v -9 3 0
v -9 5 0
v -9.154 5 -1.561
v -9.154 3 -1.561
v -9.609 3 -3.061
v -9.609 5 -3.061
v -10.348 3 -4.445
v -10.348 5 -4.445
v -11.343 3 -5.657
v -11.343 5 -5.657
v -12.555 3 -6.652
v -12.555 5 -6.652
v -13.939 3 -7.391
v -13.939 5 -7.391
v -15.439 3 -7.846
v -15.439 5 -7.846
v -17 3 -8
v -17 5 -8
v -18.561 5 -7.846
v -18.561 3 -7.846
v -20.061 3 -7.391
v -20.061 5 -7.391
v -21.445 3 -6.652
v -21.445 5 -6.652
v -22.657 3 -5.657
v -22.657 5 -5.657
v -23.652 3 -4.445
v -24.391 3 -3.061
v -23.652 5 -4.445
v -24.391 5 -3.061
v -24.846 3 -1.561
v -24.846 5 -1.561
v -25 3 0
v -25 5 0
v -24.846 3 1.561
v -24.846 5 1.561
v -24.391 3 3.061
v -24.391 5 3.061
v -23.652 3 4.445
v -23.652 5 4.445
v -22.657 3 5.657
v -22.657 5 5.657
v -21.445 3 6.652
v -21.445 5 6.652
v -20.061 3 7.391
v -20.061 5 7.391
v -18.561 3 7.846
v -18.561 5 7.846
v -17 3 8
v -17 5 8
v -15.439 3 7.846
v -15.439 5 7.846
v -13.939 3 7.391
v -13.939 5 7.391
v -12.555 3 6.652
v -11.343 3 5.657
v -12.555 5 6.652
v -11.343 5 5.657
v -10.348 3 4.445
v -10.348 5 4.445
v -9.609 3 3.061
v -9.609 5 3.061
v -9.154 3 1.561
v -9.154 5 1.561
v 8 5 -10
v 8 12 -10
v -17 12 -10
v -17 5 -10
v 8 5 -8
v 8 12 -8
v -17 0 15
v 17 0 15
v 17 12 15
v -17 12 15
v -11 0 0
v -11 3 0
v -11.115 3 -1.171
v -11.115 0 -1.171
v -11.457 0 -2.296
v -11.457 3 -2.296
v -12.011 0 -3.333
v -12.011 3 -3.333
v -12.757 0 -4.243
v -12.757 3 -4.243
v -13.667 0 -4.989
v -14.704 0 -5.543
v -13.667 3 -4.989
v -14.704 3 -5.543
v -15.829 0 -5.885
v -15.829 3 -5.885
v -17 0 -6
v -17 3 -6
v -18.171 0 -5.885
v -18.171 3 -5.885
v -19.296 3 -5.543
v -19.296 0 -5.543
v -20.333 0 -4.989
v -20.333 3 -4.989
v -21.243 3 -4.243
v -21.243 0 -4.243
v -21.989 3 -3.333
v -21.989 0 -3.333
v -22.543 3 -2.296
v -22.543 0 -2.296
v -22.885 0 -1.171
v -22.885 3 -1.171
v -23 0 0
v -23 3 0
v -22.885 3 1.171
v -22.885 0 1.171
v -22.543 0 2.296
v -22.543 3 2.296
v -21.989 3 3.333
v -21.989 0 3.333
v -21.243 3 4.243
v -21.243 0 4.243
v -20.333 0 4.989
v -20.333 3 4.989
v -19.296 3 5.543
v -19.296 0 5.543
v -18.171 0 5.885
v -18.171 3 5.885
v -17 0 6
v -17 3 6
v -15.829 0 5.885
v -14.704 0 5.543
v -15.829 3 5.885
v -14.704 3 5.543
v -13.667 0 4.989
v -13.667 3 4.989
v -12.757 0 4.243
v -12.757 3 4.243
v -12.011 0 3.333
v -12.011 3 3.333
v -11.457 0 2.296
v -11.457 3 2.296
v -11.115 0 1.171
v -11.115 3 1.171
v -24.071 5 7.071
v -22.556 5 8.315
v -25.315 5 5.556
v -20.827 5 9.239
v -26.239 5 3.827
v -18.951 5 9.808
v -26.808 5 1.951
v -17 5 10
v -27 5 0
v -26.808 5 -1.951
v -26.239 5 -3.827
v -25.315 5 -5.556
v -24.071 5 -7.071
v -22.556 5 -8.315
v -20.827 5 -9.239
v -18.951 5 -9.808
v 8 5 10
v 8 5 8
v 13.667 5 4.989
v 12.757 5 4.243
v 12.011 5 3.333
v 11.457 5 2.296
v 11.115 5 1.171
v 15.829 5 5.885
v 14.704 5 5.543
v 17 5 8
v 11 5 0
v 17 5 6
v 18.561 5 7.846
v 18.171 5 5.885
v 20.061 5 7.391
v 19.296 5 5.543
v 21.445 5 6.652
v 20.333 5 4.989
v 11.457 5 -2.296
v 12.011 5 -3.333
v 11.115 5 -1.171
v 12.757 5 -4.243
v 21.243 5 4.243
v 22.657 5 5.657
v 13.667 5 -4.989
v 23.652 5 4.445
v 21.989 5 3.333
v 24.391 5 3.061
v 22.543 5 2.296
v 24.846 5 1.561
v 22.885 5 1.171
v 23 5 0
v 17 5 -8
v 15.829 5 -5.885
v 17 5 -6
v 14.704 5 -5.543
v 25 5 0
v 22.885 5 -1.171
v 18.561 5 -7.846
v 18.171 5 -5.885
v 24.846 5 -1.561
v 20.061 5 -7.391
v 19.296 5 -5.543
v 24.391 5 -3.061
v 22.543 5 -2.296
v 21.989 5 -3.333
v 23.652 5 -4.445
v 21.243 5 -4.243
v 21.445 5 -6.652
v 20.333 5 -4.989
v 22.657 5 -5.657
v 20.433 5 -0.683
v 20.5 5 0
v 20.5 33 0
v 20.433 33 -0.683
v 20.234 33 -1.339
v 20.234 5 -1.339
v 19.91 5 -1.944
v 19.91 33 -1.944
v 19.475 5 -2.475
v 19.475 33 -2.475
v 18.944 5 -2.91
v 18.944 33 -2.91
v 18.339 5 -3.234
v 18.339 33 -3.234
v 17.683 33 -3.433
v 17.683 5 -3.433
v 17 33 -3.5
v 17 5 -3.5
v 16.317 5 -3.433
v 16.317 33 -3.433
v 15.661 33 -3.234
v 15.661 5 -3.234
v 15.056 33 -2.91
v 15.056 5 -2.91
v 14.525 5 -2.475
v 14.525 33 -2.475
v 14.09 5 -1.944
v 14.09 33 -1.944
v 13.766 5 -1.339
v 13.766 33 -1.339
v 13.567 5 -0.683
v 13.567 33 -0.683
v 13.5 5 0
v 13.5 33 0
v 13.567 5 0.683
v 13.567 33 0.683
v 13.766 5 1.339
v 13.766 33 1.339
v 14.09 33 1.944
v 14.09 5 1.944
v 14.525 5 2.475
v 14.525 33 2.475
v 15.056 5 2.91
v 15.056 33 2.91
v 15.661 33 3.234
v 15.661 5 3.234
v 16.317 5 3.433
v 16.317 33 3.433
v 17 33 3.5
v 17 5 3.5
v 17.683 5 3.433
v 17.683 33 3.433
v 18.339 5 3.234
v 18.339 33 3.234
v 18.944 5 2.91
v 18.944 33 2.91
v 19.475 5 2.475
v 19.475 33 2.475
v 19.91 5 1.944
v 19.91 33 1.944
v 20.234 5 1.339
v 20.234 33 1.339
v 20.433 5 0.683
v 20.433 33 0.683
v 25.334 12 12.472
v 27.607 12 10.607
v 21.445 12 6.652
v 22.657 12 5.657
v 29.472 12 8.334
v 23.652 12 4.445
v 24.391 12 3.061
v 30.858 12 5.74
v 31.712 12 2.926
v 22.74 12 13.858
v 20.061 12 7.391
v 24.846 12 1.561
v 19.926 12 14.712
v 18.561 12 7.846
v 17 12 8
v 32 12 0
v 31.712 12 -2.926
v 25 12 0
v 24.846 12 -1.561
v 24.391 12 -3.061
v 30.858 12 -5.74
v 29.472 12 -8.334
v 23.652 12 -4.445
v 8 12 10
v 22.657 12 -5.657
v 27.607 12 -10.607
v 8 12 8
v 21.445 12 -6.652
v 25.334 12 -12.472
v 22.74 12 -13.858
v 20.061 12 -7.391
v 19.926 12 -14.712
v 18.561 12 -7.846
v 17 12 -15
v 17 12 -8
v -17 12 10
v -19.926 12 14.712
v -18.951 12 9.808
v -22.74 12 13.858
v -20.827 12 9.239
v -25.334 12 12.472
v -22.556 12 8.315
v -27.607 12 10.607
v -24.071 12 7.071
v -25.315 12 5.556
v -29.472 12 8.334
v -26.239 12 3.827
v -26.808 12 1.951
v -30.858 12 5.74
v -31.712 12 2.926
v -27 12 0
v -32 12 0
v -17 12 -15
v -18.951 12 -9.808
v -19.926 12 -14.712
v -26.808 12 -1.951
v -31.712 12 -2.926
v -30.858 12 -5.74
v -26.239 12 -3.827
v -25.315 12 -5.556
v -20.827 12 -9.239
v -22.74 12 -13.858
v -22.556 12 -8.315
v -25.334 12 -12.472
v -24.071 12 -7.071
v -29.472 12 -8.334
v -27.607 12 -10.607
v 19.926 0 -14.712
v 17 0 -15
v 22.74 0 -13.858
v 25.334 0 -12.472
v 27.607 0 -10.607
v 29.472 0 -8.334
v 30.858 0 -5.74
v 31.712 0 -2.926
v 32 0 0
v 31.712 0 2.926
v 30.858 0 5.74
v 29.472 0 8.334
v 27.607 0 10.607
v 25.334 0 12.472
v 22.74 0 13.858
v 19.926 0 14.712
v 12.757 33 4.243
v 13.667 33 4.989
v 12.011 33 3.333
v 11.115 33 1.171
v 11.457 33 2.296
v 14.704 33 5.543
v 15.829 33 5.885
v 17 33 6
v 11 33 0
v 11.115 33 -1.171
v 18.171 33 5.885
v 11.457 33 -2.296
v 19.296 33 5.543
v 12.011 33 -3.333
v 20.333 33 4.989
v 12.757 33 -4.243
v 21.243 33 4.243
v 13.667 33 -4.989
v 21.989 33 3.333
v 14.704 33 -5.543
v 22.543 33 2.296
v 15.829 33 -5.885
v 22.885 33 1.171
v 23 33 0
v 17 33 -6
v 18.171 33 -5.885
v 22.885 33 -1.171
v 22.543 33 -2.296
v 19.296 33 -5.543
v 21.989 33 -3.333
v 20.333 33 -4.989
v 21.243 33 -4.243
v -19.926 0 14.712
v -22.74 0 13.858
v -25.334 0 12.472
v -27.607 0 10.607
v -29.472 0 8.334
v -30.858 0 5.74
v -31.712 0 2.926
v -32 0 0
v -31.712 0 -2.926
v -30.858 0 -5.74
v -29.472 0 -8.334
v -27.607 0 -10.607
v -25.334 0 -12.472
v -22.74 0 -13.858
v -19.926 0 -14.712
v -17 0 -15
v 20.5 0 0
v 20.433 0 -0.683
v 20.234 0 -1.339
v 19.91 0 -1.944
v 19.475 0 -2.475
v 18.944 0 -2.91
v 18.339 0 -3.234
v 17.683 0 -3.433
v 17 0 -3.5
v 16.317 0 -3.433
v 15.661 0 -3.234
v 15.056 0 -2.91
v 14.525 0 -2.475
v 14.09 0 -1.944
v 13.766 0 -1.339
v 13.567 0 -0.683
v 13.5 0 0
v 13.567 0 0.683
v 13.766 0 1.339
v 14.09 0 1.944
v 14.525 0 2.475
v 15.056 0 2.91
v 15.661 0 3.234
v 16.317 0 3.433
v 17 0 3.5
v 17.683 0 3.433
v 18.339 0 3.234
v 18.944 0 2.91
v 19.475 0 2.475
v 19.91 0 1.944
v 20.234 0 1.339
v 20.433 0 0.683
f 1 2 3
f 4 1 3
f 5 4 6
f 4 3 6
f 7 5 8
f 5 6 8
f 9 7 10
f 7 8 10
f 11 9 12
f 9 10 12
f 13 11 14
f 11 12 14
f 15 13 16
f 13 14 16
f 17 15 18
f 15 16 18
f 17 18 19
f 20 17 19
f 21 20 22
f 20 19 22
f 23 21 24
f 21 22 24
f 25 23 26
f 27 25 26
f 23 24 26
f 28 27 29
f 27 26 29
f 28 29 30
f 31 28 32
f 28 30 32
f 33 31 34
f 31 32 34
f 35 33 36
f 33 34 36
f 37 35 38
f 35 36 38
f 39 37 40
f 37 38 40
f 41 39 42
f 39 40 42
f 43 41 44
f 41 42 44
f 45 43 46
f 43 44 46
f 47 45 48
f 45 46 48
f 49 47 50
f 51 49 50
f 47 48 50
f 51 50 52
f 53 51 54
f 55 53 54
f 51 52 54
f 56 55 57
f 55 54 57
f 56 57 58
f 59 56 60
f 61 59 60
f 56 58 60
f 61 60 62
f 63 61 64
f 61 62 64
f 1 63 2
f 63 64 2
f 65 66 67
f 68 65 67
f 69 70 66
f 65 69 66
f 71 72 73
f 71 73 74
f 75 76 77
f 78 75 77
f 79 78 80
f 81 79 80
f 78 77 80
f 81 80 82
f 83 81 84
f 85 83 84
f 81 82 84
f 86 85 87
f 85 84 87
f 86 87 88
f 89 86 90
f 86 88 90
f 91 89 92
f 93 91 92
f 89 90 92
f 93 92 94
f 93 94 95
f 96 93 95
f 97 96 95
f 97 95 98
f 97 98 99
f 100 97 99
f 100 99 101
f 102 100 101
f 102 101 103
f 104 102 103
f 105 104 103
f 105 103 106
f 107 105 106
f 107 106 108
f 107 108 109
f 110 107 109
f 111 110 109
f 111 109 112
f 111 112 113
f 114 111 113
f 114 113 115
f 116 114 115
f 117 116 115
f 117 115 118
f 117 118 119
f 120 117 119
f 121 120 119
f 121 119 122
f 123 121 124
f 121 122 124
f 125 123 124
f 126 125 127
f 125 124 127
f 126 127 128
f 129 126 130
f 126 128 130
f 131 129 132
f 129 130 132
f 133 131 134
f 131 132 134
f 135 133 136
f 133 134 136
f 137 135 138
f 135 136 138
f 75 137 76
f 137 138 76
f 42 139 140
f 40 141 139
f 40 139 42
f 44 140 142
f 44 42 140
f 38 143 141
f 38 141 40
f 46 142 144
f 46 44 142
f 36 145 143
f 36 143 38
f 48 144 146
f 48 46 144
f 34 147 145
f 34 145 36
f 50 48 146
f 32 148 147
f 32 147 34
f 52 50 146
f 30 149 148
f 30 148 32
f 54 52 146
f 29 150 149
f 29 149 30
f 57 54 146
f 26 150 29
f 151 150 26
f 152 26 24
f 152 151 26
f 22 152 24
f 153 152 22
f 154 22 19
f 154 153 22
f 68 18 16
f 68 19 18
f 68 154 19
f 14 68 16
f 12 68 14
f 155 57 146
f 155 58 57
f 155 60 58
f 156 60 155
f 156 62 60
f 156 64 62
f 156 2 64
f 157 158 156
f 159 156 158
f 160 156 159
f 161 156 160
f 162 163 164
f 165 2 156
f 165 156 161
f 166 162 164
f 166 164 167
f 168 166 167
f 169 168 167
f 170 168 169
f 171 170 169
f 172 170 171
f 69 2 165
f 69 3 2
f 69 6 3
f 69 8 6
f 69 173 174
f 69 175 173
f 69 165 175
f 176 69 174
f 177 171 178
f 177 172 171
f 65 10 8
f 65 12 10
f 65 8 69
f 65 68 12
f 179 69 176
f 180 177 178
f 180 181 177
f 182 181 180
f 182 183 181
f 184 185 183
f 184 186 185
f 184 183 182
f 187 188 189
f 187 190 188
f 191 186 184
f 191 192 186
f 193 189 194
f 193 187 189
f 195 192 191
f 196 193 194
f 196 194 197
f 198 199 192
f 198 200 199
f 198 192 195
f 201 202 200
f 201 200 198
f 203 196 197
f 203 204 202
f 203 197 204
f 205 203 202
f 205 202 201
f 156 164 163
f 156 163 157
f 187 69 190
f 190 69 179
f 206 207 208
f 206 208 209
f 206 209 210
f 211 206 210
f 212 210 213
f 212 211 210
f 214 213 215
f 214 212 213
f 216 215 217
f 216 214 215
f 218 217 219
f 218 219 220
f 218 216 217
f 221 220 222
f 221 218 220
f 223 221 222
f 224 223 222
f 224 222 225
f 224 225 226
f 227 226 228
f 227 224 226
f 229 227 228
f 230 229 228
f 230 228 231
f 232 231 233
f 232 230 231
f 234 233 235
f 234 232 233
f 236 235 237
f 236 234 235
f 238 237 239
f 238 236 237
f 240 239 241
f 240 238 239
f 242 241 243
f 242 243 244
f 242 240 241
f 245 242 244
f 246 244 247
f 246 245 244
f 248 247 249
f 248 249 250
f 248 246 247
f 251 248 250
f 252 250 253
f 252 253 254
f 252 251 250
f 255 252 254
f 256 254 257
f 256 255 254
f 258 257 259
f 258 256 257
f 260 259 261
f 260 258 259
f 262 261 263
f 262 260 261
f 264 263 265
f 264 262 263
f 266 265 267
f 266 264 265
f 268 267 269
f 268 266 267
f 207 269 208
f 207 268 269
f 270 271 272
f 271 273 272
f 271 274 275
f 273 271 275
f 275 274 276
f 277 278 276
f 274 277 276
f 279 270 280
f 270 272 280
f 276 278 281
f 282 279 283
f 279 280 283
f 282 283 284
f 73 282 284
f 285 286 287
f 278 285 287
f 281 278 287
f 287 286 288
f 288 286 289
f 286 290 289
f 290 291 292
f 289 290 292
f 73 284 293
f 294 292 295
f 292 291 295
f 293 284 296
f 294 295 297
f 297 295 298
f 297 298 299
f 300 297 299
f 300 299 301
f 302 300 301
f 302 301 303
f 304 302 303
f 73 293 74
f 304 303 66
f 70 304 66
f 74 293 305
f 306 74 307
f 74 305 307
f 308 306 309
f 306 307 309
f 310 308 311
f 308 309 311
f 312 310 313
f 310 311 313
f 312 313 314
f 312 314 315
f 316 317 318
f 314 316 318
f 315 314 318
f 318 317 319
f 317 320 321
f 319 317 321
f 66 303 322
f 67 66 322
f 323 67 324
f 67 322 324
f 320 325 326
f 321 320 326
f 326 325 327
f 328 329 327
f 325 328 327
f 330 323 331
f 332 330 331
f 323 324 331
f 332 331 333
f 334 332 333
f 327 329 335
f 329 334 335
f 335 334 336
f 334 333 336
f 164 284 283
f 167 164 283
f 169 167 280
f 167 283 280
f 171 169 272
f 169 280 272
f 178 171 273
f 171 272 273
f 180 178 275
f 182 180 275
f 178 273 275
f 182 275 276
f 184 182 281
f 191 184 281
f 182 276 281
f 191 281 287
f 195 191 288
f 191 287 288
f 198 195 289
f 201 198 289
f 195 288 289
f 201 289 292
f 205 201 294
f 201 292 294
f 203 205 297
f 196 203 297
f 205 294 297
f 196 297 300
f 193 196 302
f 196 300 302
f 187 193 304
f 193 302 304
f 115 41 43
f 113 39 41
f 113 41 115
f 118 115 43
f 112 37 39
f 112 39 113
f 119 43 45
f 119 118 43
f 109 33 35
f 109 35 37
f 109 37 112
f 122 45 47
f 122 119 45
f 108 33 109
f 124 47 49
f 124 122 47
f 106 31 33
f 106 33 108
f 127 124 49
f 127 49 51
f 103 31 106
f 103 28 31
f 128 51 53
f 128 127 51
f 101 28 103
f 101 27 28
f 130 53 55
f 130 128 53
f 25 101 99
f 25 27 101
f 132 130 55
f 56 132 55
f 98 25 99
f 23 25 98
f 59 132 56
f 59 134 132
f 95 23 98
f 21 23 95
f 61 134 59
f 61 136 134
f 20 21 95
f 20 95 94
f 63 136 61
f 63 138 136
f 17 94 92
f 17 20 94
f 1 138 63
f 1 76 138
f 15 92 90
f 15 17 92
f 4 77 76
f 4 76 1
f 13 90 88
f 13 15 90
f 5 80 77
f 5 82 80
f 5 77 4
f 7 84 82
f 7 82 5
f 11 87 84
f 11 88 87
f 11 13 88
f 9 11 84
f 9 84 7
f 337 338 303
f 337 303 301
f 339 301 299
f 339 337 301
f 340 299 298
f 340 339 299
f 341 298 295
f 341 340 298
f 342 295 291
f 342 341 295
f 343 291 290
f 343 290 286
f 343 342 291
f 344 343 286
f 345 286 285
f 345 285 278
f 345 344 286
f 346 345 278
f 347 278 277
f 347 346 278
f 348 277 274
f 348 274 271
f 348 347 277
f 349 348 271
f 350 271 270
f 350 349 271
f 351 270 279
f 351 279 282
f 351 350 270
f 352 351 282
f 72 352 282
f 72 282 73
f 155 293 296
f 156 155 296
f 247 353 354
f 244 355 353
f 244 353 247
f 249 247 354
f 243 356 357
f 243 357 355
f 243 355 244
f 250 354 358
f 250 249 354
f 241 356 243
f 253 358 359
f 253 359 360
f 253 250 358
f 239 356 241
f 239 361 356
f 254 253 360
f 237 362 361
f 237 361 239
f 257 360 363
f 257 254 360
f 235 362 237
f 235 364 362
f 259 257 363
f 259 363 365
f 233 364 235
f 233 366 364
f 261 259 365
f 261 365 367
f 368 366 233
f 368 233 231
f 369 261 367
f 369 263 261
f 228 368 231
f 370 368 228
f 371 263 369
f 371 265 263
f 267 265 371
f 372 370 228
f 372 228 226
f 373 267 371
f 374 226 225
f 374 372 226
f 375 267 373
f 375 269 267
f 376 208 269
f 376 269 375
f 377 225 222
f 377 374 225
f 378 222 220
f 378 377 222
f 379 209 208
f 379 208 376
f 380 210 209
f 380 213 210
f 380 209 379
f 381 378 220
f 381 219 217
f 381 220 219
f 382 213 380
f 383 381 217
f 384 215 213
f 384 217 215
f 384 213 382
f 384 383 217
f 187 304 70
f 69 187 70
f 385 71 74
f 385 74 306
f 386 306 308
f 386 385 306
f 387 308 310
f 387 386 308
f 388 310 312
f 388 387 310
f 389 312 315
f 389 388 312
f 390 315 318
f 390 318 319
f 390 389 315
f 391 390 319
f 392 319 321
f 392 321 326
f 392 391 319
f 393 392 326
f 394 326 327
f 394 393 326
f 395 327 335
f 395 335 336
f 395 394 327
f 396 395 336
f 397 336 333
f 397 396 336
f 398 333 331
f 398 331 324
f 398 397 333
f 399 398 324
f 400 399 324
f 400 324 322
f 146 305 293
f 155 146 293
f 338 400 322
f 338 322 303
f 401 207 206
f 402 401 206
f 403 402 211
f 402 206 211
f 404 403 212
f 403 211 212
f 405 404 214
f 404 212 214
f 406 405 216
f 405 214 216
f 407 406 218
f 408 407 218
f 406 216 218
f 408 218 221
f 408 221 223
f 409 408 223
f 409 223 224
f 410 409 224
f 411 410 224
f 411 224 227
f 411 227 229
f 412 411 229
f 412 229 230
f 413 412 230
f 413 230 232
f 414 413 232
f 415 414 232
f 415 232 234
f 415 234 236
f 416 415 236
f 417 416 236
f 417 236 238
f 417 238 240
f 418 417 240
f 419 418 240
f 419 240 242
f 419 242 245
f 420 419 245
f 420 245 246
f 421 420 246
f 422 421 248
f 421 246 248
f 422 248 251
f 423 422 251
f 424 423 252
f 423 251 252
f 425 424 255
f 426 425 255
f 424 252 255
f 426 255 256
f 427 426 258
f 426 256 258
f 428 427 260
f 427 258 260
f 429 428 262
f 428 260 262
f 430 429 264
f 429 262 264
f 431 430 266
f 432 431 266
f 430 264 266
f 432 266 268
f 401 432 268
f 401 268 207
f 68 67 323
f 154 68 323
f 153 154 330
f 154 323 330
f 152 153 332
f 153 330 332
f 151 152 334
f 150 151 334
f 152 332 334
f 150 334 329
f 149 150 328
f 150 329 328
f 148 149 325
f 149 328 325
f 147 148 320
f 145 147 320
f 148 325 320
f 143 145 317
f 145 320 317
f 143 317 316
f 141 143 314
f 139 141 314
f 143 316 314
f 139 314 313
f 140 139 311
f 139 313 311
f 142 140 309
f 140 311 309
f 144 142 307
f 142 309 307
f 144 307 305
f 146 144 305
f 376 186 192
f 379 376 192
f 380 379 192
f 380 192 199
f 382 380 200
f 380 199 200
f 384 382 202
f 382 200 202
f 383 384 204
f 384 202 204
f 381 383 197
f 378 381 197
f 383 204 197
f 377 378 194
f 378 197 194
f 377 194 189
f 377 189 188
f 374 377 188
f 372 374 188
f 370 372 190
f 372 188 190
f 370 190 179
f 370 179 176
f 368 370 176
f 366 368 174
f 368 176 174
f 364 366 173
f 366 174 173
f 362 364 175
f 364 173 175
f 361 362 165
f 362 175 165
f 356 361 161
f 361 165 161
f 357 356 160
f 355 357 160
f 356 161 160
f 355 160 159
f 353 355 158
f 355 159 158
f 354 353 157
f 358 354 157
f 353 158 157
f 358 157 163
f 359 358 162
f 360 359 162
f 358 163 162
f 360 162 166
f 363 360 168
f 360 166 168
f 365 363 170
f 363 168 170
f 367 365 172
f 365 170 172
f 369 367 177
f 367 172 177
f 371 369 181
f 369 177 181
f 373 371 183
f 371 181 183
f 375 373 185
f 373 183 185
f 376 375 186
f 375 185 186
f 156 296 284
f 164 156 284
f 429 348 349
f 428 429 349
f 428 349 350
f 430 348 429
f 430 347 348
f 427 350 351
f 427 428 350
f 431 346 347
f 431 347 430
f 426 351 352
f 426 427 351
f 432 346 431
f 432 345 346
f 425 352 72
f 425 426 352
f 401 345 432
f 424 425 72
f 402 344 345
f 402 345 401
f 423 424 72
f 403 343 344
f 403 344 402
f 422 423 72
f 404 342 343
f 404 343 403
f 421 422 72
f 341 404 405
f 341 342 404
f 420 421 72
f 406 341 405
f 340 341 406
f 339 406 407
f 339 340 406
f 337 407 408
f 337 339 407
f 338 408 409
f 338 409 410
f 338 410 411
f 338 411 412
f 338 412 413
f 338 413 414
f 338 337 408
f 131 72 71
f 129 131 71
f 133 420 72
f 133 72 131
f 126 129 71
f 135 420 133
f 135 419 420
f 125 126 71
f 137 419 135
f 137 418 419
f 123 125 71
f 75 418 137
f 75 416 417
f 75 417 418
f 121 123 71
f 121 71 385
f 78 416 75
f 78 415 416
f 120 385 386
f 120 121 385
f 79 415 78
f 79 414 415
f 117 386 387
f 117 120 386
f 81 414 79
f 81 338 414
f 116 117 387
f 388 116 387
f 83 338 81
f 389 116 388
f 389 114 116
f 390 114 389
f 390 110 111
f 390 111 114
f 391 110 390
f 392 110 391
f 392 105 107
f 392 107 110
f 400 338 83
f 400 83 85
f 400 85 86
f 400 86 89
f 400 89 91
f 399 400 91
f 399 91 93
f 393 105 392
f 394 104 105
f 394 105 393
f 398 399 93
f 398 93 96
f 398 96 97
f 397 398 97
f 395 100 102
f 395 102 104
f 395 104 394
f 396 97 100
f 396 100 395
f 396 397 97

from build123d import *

# Parameters (mm, degrees)
BOSS_EXTRUDE1_DEPTH = 12
CUT_EXTRUDE1_DEPTH  = 7
SKETCH3_R           = 6
SKETCH3_R_2         = 3.5
BOSS_EXTRUDE2_DEPTH = 28
CUT_EXTRUDE2_START  = -28
SKETCH4_R           = 3.5
CUT_EXTRUDE2_DEPTH  = 28
SKETCH5_R           = 8
SKETCH5_R_2         = 6
CUT_EXTRUDE3_DEPTH  = 2
SKETCH5_3_R         = 6
CUT_EXTRUDE4_DEPTH  = 46.08880127


with BuildPart() as part:
    # Sketch1 → Boss-Extrude1 (new body)
    with BuildSketch(Plane(origin=(0, 0, 0), x_dir=(1, 0, 0), z_dir=(0, 1, 0))):
        with BuildLine():
            Line((-17, 15), (17, 15))
            ThreePointArc((17, 15), (32, 0), (17, -15))
            Line((17, -15), (-17, -15))
            ThreePointArc((-17, -15), (-32, 0), (-17, 15))
        make_face()
    extrude(amount=BOSS_EXTRUDE1_DEPTH)

    # Sketch2 → Cut-Extrude1 (cut)
    with BuildSketch(Plane(origin=(0, 12, 0), x_dir=(1, 0, 0), z_dir=(0, 1, 0))):
        with BuildLine():
            Line((8, 10), (-17, 10))
            ThreePointArc((-17, 10), (-27, 0), (-17, -10))
            Line((-17, -10), (8, -10))
            Line((8, -10), (8, -8))
            Line((8, -8), (17, -8))
            ThreePointArc((17, -8), (25, 0), (17, 8))
            Line((17, 8), (8, 8))
            Line((8, 8), (8, 10))
        make_face()
    extrude(amount=-CUT_EXTRUDE1_DEPTH, mode=Mode.SUBTRACT)

    # Sketch3 → Boss-Extrude2 (add)
    with BuildSketch(Plane(origin=(0, 5, 0), x_dir=(1, 0, 0), z_dir=(0, 1, 0))):
        with Locations((17, 0)):
            Circle(SKETCH3_R)
        with Locations((17, 0)):
            Circle(SKETCH3_R_2, mode=Mode.SUBTRACT)
    extrude(amount=BOSS_EXTRUDE2_DEPTH)

    # Sketch4 → Cut-Extrude2 (cut)
    with BuildSketch(Plane(origin=(0, 5, 0), x_dir=(1, 0, 0), z_dir=(0, 1, 0)).offset(CUT_EXTRUDE2_START)):
        with Locations((17, 0)):
            Circle(SKETCH4_R)
    extrude(amount=CUT_EXTRUDE2_DEPTH, mode=Mode.SUBTRACT)

    # Sketch5 → Cut-Extrude3 (cut)
    with BuildSketch(Plane(origin=(0, 5, 0), x_dir=(1, 0, 0), z_dir=(0, 1, 0))):
        with Locations((-17, 0)):
            Circle(SKETCH5_R)
        with Locations((-17, 0)):
            Circle(SKETCH5_R_2, mode=Mode.SUBTRACT)
    extrude(amount=-CUT_EXTRUDE3_DEPTH, mode=Mode.SUBTRACT)

    # Sketch5<3> → Cut-Extrude4 (cut, through all)
    with BuildSketch(Plane(origin=(0, 5, 0), x_dir=(1, 0, 0), z_dir=(0, 1, 0))):
        with Locations((-17, 0)):
            Circle(SKETCH5_3_R)
    extrude(amount=-CUT_EXTRUDE4_DEPTH, mode=Mode.SUBTRACT)


solid = part.part
